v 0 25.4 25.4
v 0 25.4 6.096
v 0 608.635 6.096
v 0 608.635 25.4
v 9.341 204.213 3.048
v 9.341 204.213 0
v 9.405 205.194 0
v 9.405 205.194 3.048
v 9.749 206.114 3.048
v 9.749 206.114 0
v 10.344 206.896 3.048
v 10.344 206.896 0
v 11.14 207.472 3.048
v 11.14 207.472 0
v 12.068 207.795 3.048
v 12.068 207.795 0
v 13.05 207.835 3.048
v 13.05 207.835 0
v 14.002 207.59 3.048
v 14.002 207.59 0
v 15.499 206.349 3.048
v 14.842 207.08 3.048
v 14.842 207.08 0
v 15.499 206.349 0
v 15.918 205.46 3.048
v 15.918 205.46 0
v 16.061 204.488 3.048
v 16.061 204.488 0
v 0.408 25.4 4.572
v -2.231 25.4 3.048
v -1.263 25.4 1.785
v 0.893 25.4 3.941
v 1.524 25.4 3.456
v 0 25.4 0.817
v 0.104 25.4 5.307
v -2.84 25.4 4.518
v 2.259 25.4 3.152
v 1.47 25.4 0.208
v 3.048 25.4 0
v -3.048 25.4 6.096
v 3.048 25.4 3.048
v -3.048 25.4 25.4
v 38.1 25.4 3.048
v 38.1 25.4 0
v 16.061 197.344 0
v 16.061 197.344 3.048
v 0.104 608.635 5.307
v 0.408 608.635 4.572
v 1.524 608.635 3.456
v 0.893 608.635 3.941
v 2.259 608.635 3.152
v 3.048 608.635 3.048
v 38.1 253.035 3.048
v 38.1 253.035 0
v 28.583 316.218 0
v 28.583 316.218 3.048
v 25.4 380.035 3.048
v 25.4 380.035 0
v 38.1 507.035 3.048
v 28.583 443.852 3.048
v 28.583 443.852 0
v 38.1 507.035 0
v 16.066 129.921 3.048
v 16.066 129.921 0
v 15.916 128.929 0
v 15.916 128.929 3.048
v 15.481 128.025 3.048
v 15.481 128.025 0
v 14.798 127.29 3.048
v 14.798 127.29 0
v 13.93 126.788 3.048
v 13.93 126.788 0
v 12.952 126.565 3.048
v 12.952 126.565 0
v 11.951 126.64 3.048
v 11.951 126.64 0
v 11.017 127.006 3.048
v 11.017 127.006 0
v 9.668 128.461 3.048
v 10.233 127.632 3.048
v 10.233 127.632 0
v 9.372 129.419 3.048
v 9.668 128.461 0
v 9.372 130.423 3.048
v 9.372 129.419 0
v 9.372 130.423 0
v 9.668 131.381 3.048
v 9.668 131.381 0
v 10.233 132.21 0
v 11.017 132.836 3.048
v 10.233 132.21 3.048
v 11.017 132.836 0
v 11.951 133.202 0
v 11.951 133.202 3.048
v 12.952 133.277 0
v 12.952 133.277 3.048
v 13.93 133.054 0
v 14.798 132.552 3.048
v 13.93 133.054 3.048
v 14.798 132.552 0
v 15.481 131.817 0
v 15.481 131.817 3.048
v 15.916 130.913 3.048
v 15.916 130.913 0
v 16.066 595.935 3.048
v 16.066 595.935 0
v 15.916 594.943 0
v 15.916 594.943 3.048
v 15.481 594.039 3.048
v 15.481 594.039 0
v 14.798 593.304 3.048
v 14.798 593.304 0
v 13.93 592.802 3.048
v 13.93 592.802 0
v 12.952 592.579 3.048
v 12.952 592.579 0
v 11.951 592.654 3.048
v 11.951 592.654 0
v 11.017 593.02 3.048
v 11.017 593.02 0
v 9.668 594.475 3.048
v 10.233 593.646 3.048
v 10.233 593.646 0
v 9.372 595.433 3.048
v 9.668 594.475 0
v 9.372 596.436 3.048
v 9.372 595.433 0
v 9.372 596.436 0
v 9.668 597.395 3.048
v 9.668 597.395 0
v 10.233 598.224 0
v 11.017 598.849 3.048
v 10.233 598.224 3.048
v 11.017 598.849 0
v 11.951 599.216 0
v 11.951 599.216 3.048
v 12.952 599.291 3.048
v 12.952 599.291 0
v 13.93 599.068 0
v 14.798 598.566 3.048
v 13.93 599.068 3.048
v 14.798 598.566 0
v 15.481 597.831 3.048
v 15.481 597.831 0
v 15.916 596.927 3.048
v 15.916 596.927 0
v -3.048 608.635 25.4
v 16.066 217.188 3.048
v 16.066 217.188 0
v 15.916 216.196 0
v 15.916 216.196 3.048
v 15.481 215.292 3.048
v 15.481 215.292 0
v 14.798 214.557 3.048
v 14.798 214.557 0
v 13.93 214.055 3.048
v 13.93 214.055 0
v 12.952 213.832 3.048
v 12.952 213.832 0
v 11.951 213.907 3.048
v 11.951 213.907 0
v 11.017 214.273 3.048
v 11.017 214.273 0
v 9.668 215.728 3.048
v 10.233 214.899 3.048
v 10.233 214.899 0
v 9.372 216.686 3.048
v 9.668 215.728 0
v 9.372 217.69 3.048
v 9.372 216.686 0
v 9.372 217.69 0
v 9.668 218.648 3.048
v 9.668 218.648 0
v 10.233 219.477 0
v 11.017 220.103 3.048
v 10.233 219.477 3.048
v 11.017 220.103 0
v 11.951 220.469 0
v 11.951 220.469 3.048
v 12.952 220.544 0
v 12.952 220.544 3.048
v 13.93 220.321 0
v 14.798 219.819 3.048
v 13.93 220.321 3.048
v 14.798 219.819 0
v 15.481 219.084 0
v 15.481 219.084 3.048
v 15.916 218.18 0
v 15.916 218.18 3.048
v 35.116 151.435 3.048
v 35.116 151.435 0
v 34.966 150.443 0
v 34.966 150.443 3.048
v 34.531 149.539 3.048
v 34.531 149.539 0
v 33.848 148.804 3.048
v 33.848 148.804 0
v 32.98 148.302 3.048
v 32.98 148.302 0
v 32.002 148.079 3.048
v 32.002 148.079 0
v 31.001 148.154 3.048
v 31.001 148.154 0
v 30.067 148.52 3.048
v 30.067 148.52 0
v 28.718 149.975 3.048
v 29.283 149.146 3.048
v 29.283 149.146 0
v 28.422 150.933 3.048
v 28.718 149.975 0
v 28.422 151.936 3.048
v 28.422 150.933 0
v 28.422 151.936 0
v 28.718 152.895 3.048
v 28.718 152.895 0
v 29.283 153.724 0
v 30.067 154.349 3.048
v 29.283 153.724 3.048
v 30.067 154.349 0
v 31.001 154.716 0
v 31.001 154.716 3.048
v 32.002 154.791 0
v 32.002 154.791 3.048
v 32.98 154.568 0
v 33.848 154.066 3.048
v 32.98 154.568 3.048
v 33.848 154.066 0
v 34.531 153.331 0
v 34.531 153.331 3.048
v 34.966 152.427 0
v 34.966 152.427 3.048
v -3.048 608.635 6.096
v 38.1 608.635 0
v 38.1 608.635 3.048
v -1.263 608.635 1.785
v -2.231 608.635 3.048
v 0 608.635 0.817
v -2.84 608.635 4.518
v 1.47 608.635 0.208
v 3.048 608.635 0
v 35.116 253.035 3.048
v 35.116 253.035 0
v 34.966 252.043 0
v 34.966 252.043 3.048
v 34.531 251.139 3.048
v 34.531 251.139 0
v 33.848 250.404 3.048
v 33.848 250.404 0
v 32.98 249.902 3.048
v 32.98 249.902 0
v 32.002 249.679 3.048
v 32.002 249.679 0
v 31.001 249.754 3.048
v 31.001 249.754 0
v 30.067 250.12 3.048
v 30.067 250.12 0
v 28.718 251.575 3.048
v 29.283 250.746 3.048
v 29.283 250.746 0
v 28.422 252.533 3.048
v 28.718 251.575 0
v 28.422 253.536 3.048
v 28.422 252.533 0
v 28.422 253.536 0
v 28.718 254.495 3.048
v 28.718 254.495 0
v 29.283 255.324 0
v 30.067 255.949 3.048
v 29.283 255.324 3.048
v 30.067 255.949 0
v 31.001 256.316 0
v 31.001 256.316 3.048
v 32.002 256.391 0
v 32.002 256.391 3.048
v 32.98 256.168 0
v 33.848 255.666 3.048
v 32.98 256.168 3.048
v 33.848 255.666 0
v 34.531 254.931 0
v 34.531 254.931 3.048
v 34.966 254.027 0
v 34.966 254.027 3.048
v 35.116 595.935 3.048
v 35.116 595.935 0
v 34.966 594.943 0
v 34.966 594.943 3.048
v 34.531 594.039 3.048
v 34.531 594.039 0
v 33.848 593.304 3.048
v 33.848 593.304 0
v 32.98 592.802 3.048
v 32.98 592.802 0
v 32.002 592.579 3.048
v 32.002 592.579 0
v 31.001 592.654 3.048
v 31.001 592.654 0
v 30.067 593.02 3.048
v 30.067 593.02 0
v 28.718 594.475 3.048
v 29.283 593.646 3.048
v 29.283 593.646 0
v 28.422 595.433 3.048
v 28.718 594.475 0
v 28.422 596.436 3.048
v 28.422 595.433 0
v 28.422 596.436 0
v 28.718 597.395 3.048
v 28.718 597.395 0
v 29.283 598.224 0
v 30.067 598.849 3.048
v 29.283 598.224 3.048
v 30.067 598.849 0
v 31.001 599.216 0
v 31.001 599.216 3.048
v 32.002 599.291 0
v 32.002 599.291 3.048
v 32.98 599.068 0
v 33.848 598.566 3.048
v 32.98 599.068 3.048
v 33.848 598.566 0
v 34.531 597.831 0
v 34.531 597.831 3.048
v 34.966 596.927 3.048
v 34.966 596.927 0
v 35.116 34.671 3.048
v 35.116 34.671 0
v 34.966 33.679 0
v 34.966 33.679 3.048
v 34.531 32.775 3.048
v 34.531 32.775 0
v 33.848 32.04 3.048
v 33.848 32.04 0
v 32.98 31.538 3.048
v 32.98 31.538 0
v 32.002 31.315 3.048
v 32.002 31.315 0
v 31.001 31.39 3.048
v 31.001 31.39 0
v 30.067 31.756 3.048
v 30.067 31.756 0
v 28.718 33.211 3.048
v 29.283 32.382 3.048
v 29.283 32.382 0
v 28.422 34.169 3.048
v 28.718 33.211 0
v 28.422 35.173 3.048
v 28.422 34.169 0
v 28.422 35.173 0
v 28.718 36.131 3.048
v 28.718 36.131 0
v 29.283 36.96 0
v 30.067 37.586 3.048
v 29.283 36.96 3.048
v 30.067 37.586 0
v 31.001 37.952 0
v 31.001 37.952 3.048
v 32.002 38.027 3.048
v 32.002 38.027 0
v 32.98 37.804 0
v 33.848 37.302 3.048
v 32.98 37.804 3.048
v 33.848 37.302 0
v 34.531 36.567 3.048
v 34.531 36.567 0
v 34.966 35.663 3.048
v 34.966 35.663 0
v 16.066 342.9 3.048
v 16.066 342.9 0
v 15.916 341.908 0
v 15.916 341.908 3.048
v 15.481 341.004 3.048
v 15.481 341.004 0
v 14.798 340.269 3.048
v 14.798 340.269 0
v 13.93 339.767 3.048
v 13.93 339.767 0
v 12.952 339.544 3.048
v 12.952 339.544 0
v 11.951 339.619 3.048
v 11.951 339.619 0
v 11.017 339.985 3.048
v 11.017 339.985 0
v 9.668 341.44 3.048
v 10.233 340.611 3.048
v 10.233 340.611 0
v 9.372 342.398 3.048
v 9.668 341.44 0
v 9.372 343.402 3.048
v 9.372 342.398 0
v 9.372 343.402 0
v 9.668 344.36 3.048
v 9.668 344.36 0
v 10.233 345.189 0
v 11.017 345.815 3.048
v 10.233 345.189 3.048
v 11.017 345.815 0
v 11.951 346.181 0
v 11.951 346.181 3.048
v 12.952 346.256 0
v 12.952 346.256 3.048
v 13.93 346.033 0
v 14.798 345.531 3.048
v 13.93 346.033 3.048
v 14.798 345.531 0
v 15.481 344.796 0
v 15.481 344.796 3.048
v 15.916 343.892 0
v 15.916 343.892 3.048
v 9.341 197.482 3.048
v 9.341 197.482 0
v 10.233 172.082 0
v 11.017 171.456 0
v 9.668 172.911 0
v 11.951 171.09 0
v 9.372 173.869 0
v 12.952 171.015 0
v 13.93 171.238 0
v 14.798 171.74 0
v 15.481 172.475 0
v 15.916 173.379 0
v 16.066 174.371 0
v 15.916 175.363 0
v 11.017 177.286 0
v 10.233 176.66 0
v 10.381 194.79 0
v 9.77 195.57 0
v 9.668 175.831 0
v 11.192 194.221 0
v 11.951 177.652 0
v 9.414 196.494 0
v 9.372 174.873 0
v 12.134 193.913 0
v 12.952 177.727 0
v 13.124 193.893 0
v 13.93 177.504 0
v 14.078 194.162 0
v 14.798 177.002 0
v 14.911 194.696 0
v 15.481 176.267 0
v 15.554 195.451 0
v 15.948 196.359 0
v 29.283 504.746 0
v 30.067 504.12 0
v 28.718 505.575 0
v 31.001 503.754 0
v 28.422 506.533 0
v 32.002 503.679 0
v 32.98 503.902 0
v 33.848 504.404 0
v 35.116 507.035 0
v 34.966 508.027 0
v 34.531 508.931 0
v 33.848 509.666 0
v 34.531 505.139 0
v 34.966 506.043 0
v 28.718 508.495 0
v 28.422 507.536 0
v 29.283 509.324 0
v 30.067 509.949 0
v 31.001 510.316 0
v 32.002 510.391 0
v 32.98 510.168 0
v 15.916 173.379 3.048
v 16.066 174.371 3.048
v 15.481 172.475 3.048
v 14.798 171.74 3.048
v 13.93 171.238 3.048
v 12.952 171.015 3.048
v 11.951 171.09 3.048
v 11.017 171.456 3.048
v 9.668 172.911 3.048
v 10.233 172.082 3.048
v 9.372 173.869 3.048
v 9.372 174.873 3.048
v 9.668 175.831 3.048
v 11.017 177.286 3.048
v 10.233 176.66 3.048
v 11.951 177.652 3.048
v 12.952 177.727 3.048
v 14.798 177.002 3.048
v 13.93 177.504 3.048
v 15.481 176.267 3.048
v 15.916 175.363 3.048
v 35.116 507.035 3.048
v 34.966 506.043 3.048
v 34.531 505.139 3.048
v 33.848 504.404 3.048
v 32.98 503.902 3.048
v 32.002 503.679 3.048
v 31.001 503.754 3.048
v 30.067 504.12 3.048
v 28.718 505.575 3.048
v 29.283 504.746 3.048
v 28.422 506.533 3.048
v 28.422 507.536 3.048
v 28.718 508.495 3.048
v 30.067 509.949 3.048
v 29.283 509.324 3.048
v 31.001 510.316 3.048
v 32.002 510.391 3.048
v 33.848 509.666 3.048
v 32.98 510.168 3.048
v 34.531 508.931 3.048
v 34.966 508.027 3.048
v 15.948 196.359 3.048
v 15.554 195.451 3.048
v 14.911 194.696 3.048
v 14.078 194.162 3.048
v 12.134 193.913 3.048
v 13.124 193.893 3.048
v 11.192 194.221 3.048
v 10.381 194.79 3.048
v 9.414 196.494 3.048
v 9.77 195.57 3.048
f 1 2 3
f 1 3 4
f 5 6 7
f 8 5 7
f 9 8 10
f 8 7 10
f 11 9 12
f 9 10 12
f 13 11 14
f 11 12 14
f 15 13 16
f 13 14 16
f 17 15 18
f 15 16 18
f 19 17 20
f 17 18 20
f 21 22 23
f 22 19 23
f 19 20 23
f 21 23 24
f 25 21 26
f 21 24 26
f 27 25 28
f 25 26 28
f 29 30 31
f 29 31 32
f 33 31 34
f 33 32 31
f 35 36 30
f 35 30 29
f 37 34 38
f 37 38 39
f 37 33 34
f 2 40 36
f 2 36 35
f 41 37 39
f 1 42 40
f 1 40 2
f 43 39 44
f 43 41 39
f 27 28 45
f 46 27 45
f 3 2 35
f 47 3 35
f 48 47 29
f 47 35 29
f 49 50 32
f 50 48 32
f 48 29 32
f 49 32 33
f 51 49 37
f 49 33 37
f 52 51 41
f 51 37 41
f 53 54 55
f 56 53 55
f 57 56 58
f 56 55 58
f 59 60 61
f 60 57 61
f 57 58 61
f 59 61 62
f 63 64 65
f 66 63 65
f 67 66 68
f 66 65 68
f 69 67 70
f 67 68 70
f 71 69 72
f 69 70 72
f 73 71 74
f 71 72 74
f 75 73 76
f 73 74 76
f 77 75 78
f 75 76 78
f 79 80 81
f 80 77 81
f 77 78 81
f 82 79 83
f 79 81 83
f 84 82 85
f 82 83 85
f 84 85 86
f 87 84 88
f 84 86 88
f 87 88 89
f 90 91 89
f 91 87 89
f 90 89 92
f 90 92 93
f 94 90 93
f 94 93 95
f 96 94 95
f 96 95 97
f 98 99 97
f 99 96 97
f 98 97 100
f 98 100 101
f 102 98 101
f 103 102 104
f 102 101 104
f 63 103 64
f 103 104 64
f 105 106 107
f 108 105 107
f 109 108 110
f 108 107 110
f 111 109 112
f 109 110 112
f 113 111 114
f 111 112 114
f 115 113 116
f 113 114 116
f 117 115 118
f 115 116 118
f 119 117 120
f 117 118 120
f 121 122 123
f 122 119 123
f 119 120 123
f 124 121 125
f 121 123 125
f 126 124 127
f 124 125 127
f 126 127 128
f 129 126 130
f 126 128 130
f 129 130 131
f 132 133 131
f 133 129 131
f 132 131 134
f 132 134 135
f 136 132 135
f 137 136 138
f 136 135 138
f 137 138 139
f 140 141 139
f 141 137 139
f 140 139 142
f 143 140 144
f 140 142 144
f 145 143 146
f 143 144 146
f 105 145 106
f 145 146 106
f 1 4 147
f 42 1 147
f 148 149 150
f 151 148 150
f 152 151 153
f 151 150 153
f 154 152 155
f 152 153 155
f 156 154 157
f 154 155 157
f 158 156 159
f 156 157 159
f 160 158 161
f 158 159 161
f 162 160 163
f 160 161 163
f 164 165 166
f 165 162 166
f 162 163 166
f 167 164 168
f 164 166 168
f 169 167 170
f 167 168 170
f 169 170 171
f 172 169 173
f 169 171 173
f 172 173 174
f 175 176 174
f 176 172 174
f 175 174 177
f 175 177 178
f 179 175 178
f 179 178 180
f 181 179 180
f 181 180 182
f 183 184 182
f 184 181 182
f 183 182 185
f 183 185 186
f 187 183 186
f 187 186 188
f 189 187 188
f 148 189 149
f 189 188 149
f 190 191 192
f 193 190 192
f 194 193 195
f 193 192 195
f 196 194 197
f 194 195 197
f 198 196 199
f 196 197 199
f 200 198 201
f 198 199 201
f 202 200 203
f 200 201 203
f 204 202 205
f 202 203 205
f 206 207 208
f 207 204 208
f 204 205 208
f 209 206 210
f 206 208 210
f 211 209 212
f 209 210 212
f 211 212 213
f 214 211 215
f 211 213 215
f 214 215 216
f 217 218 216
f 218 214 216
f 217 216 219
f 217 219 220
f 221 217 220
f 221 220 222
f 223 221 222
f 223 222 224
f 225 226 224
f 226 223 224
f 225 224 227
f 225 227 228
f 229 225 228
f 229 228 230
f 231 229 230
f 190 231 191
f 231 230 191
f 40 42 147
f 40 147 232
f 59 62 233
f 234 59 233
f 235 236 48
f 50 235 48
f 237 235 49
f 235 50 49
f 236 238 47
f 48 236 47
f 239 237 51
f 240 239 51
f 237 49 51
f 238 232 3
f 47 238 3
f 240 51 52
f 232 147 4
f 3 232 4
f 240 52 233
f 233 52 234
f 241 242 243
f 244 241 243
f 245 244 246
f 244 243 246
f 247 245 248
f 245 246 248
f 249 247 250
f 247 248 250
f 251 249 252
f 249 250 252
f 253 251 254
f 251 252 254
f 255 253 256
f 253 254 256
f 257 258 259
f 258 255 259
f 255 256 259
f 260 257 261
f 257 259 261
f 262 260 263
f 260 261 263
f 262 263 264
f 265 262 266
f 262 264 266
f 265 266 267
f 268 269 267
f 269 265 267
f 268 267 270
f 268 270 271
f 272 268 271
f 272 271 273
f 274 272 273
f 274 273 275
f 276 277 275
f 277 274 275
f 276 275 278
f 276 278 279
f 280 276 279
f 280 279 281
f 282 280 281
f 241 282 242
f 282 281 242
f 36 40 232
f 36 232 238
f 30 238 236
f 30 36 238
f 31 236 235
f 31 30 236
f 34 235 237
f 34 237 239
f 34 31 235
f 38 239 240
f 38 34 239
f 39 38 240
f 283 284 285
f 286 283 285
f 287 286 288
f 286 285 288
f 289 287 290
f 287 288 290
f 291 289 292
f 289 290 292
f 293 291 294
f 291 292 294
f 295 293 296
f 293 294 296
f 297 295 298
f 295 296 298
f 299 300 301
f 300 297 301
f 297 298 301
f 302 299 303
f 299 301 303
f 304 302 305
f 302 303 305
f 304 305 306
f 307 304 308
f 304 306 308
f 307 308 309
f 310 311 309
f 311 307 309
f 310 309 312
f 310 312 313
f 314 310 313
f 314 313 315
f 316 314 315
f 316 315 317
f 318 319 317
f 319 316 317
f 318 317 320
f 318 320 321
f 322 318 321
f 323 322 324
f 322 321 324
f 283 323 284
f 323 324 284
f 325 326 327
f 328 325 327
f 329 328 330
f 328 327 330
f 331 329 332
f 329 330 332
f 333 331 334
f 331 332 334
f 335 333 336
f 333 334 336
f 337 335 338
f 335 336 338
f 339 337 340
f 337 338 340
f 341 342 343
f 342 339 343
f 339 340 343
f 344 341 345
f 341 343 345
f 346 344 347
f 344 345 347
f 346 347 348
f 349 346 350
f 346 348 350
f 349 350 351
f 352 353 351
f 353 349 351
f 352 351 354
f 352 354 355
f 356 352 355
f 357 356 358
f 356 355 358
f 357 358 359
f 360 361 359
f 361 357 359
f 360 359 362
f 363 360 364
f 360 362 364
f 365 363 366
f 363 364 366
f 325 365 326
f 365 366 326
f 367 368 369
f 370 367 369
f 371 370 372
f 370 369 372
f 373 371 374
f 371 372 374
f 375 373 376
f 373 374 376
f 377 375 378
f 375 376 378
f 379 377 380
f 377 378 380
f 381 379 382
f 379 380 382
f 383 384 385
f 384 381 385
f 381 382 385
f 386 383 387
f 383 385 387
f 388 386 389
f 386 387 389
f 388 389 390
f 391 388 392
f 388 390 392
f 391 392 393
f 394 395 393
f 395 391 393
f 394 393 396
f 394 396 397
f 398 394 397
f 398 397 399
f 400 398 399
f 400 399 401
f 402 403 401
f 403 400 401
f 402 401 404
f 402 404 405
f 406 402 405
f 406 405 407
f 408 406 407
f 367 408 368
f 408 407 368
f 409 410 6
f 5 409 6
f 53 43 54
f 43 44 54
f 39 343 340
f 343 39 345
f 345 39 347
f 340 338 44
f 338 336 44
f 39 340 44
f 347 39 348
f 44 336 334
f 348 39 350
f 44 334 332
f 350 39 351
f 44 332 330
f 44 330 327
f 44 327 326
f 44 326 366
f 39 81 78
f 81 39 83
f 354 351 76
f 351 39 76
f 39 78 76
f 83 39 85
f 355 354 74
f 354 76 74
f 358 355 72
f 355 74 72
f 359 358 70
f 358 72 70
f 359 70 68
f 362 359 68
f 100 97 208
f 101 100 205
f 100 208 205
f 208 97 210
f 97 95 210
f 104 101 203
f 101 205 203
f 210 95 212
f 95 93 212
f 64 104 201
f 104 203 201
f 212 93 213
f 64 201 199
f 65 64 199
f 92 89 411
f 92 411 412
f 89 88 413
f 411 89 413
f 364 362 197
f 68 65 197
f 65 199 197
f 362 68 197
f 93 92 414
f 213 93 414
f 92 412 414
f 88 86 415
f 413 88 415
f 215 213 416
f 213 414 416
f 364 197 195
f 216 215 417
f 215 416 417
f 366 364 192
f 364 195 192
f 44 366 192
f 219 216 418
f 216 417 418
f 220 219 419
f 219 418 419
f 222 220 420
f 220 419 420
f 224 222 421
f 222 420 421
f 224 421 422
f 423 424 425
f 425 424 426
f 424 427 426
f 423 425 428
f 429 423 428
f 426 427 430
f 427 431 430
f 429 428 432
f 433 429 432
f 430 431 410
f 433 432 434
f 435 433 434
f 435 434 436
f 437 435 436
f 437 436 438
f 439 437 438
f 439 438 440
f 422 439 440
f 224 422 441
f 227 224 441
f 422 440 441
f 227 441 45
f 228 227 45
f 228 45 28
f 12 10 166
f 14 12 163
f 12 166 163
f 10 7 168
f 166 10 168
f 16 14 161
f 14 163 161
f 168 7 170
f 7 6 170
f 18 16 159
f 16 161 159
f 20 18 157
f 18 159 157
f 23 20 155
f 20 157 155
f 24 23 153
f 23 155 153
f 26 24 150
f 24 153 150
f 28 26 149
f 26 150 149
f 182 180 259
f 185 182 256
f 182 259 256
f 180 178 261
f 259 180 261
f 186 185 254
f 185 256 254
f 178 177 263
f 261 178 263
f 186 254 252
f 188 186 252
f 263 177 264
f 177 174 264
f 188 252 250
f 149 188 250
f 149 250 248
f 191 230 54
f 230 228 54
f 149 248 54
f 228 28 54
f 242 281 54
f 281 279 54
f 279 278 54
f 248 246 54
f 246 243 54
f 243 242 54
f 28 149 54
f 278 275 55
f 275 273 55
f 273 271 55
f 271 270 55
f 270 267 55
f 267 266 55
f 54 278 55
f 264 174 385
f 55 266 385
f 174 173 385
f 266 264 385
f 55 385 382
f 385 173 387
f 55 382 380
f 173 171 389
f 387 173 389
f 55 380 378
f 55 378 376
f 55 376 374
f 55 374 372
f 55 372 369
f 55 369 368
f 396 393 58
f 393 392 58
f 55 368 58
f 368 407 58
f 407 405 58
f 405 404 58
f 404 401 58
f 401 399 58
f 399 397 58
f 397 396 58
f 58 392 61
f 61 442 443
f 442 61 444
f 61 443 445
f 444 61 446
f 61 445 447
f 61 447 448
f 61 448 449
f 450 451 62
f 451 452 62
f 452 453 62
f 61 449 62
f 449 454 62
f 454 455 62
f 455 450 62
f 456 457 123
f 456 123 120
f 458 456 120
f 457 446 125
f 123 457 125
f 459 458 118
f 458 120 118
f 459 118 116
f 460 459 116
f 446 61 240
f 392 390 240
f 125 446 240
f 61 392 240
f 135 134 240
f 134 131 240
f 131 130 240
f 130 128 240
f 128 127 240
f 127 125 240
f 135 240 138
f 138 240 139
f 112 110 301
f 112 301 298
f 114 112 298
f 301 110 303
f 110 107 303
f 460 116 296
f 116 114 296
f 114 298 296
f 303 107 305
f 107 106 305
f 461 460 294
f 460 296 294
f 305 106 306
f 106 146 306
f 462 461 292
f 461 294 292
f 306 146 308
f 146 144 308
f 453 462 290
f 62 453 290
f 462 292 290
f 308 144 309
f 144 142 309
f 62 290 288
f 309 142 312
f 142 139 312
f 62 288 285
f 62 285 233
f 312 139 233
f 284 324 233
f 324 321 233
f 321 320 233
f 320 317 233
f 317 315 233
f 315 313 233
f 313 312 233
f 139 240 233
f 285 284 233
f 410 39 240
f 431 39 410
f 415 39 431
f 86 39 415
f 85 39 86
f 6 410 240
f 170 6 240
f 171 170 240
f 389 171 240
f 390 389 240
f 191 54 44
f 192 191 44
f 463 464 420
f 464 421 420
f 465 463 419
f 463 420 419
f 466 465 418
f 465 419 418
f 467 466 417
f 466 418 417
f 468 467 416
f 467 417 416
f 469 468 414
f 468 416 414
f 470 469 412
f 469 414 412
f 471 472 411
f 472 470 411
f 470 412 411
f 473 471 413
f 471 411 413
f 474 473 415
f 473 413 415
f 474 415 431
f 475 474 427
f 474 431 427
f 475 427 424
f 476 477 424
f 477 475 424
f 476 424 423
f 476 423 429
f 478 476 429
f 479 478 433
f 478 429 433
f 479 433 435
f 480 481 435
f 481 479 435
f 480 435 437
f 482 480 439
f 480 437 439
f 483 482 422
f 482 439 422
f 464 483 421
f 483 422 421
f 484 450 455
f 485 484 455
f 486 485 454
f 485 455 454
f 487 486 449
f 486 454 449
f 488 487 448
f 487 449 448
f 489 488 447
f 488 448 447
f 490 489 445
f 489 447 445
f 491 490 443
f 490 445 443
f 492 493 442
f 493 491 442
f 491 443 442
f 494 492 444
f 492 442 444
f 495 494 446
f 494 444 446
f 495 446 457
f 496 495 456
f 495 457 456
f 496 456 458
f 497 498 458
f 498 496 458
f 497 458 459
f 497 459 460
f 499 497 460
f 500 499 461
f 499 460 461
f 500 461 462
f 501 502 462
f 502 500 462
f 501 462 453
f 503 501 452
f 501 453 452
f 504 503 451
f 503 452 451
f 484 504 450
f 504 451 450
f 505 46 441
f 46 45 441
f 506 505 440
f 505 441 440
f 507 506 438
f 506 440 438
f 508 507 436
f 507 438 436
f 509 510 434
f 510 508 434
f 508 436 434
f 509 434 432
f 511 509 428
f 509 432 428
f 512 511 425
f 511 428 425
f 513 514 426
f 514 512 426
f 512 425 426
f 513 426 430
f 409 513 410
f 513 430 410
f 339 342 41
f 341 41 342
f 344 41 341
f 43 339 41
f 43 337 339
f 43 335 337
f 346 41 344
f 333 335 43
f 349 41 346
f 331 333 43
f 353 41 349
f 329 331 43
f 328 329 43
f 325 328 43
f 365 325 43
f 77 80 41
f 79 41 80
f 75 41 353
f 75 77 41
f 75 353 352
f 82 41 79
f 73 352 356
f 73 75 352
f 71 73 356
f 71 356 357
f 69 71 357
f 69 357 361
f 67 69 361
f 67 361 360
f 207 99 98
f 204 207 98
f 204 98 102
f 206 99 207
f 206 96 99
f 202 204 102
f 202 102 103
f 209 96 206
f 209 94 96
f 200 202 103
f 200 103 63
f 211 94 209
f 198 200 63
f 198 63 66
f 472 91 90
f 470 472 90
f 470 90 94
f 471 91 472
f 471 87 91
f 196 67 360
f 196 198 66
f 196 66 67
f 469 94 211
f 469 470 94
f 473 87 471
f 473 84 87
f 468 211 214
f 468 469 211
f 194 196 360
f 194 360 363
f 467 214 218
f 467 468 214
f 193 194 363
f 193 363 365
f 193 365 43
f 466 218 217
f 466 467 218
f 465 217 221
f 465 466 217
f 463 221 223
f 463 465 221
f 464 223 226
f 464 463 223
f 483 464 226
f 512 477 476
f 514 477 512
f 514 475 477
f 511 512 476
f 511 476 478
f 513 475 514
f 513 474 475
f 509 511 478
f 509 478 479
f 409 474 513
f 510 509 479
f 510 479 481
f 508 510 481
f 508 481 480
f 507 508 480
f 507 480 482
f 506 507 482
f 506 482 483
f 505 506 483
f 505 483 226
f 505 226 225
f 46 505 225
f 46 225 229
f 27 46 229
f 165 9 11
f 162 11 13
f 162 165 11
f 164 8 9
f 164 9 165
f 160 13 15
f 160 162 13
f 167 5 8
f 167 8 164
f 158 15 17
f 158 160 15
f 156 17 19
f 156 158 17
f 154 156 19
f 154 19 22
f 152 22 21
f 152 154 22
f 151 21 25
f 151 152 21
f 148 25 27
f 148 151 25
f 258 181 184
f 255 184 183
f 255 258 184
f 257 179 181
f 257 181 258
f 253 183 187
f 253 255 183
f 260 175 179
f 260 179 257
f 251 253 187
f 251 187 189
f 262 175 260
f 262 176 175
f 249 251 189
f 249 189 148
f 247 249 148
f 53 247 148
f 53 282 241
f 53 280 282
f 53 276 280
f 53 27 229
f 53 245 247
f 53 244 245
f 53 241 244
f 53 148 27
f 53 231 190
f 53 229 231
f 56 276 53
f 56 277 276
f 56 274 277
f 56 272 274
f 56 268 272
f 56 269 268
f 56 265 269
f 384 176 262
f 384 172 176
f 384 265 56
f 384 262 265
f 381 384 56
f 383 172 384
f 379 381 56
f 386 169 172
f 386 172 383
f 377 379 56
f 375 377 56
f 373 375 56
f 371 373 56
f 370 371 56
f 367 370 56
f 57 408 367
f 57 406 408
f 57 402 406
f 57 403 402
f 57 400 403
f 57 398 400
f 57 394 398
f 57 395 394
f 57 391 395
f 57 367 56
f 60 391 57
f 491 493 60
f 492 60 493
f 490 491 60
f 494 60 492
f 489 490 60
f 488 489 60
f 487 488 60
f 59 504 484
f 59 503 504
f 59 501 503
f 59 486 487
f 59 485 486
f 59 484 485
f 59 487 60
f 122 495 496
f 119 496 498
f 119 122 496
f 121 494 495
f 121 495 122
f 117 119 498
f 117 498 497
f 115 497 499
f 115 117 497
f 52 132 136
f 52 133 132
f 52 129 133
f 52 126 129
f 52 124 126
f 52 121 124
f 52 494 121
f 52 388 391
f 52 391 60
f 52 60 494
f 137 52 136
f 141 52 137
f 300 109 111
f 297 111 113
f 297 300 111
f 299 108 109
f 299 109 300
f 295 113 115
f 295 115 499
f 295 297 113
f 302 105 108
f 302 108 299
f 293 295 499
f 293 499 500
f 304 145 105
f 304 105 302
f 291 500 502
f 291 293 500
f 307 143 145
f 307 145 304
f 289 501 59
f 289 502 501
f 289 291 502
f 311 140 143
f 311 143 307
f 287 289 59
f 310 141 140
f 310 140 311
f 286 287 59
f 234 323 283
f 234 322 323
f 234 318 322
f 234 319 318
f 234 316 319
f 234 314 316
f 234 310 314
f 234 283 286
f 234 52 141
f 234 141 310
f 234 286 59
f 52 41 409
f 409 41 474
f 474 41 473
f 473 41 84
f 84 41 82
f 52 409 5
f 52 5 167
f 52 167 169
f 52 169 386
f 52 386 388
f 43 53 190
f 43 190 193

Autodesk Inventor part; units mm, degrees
ref_plane "YZ Plane" through (0, 0, 0) normal (1, 0, 0) x (0, 1, 0)
ref_plane "XZ Plane" through (0, 0, 0) normal (0, 1, 0) x (-1, 0, 0)
ref_plane "XY Plane" through (0, 0, 0) normal (0, 0, 1) x (1, 0, 0)
sketch "Sketch1" plane through (0, 0, 0) normal (0, 0, 1) x (1, 0, 0)
  line L0 (0, 0) -> (38.1, 0)
  line L1 (38.1, 0) -> (38.1, 253.0348)
  arc A0 (38.1, 507.0348) -> (38.1, 253.0348) centre (666.75, 380.0348) ccw
  line L2 (38.1, 507.0348) -> (38.1, 608.6348)
  line L3 (38.1, 608.6348) -> (0, 608.6348)
  line L4 (0, 608.6348) -> (0, 0)
  circle A1 centre (31.75, 151.4348) radius 3.3655
  circle A2 centre (31.75, 34.671) radius 3.3655
  circle A3 centre (12.7, 12.7) radius 3.3655
  circle A4 centre (12.7, 342.9) radius 3.3655
  circle A5 centre (12.7, 595.9348) radius 3.3655
  circle A6 centre (31.75, 12.7) radius 3.3655
  circle A7 centre (31.75, 253.0348) radius 3.3655
  circle A8 centre (31.75, 507.0348) radius 3.3655
  circle A9 centre (31.75, 595.9348) radius 3.3655
  line L5 (0, 557.8348) -> (0, 608.6348)
  line L6 (0, 50.8) -> (0, 0)
  line L7 (12.7, 342.9) -> (0, 304.3174) construction
  line L8 (0, 317.5) -> (0, 368.3)
  line L9 (0, 129.921) -> (12.7, 129.921) construction
  circle A10 centre (12.7, 129.921) radius 3.3655
  circle A11 centre (12.7, 174.371) radius 3.3655
  line L10 (9.3413, 197.482) -> (9.3413, 204.213)
  line L11 (16.0611, 204.488) -> (16.0611, 197.3435)
  arc A12 (16.0611, 204.488) -> (9.3413, 204.213) centre (12.6956, 204.488) ccw
  arc A13 (9.3413, 197.482) -> (16.0611, 197.3435) centre (12.6974, 197.231) ccw
  circle A14 centre (12.7, 217.188) radius 3.3655
  dimension "d0" = 38.1
  dimension "d2" = 101.6
  dimension "d4" = 457.2
  dimension "d5" = 101.6
  dimension "d6" = 666.75
  dimension "d7" = 641.35
  dimension "d9" = 116.7638
  dimension "d10" = 6.35
  dimension "d11" = 6.35
  dimension "d13" = 12.7
  dimension "d14" = 12.7
  dimension "d16" = 12.7
  dimension "d17" = 342.9
  dimension "d19" = 12.7
  dimension "d20" = 12.7
  dimension "d22" = 6.35
  dimension "d24" = 6.35
  dimension "d25" = 6.731
  dimension "d26" = 6.35
  dimension "hole" = 6.731
  dimension "d28" = 6.35
  dimension "d45" = 12.7
  dimension "d47" = 12.7
  dimension "d54" = 6.731
  dimension "d55" = 3.3655
  dimension "d56" = 3.3655
  dimension "d58" = 6.731
  dimension "d59" = 12.7
  dimension "d68" = 18.22
  dimension "d69" = 90
  dimension "d70" = 90
  dimension "d71" = 22.0389
  dimension "d72" = 28.7587
  dimension "d73" = 478.7138
  dimension "d74" = 6.35
  dimension "d75" = 6.35
  dimension "d76" = 595.9348
  dimension "d77" = 404.1468
  dimension "d78" = 411.2913
  dimension "d79" = 25.4
  dimension "d80" = 25.4
  dimension "d81" = 434.2638
  dimension "d82" = 50.8
  dimension "d83" = 240.3348
  dimension "d84" = 291.1348
  dimension "d85" = 557.8348
extrude "Plate4" add sketch "Sketch1" along normal blind 3.048
sketch "Sketch5" plane through (0, 0, 3.048) normal (0, 0, 1) x (1, 0, 0)
  line L0 (38.1, 0) -> (38.1, 253.0348) projected
  line L1 (0, 0) -> (38.1, 0)
  line L2 (38.1, 0) -> (38.1, 25.4)
  line L3 (38.1, 25.4) -> (0, 25.4)
  line L4 (0, 25.4) -> (0, 0)
  dimension "d96" = 25.4
extrude "Cut1" cut sketch "Sketch5" against normal blind 3.048
sketch "Sketch7" plane through (0, 25.4, 3.048) normal (-1, 0, 0) x (0, -1, 0)
  line L0 (-583.2348, 0) -> (0, 0)
  line L1 (0, 0) -> (0, 22.352)
  line L2 (0, 22.352) -> (-583.2348, 22.352)
  line L3 (-583.2348, 22.352) -> (-583.2348, 0)
edge flange "Flange3" height 25.4 angle 90 thickness 3.048 bend radius 3.048 thickness toward (-1, 0, 0) relief tear relief width 3.048 relief depth 1.524 edges at (0, 317.0174, 3.048) wall of the first edge with corners at (0, 608.6348, 3.048) (0, 25.4, 3.048) (0, 25.4, 25.4) (0, 608.6348, 25.4)
bend "Bend3"
corner "Corner3"
equation "\"d25\" = hole"
equation "\"d97\" = Thickness"
equation "\"d109\" = BendReliefWidth"
equation "\"d110\" = BendReliefDepth"
equation "\"d111\" = MinimumRemnant"
equation "\"d112\" = BendRadius"
equation "\"d115\" = BendRadius"
equation "\"d116\" = CornerReliefSize"
equation "\"d117\" = GapSize"
equation "\"d118\" = JacobiRadiusSize"
equation "\"BendRadius\" = Thickness"
equation "\"BendReliefWidth\" = Thickness"
equation "\"BendReliefDepth\" = 0.5 * Thickness"
equation "\"CornerReliefSize\" = 4 * Thickness"
equation "\"MinimumRemnant\" = 2 * Thickness"
equation "\"TransitionRadius\" = BendRadius"
equation "\"JacobiRadiusSize\" = BendRadius"
equation "\"GapSize\" = Thickness"
equation "\"d29\" = BendRadius"
equation "\"d32\" = BendRadius"
equation "\"d38\" = BendRadius"
equation "\"d60\" = BendRadius"
equation "\"Thickness\" = 3.048"
properties part number "clawRTOP-v2"
